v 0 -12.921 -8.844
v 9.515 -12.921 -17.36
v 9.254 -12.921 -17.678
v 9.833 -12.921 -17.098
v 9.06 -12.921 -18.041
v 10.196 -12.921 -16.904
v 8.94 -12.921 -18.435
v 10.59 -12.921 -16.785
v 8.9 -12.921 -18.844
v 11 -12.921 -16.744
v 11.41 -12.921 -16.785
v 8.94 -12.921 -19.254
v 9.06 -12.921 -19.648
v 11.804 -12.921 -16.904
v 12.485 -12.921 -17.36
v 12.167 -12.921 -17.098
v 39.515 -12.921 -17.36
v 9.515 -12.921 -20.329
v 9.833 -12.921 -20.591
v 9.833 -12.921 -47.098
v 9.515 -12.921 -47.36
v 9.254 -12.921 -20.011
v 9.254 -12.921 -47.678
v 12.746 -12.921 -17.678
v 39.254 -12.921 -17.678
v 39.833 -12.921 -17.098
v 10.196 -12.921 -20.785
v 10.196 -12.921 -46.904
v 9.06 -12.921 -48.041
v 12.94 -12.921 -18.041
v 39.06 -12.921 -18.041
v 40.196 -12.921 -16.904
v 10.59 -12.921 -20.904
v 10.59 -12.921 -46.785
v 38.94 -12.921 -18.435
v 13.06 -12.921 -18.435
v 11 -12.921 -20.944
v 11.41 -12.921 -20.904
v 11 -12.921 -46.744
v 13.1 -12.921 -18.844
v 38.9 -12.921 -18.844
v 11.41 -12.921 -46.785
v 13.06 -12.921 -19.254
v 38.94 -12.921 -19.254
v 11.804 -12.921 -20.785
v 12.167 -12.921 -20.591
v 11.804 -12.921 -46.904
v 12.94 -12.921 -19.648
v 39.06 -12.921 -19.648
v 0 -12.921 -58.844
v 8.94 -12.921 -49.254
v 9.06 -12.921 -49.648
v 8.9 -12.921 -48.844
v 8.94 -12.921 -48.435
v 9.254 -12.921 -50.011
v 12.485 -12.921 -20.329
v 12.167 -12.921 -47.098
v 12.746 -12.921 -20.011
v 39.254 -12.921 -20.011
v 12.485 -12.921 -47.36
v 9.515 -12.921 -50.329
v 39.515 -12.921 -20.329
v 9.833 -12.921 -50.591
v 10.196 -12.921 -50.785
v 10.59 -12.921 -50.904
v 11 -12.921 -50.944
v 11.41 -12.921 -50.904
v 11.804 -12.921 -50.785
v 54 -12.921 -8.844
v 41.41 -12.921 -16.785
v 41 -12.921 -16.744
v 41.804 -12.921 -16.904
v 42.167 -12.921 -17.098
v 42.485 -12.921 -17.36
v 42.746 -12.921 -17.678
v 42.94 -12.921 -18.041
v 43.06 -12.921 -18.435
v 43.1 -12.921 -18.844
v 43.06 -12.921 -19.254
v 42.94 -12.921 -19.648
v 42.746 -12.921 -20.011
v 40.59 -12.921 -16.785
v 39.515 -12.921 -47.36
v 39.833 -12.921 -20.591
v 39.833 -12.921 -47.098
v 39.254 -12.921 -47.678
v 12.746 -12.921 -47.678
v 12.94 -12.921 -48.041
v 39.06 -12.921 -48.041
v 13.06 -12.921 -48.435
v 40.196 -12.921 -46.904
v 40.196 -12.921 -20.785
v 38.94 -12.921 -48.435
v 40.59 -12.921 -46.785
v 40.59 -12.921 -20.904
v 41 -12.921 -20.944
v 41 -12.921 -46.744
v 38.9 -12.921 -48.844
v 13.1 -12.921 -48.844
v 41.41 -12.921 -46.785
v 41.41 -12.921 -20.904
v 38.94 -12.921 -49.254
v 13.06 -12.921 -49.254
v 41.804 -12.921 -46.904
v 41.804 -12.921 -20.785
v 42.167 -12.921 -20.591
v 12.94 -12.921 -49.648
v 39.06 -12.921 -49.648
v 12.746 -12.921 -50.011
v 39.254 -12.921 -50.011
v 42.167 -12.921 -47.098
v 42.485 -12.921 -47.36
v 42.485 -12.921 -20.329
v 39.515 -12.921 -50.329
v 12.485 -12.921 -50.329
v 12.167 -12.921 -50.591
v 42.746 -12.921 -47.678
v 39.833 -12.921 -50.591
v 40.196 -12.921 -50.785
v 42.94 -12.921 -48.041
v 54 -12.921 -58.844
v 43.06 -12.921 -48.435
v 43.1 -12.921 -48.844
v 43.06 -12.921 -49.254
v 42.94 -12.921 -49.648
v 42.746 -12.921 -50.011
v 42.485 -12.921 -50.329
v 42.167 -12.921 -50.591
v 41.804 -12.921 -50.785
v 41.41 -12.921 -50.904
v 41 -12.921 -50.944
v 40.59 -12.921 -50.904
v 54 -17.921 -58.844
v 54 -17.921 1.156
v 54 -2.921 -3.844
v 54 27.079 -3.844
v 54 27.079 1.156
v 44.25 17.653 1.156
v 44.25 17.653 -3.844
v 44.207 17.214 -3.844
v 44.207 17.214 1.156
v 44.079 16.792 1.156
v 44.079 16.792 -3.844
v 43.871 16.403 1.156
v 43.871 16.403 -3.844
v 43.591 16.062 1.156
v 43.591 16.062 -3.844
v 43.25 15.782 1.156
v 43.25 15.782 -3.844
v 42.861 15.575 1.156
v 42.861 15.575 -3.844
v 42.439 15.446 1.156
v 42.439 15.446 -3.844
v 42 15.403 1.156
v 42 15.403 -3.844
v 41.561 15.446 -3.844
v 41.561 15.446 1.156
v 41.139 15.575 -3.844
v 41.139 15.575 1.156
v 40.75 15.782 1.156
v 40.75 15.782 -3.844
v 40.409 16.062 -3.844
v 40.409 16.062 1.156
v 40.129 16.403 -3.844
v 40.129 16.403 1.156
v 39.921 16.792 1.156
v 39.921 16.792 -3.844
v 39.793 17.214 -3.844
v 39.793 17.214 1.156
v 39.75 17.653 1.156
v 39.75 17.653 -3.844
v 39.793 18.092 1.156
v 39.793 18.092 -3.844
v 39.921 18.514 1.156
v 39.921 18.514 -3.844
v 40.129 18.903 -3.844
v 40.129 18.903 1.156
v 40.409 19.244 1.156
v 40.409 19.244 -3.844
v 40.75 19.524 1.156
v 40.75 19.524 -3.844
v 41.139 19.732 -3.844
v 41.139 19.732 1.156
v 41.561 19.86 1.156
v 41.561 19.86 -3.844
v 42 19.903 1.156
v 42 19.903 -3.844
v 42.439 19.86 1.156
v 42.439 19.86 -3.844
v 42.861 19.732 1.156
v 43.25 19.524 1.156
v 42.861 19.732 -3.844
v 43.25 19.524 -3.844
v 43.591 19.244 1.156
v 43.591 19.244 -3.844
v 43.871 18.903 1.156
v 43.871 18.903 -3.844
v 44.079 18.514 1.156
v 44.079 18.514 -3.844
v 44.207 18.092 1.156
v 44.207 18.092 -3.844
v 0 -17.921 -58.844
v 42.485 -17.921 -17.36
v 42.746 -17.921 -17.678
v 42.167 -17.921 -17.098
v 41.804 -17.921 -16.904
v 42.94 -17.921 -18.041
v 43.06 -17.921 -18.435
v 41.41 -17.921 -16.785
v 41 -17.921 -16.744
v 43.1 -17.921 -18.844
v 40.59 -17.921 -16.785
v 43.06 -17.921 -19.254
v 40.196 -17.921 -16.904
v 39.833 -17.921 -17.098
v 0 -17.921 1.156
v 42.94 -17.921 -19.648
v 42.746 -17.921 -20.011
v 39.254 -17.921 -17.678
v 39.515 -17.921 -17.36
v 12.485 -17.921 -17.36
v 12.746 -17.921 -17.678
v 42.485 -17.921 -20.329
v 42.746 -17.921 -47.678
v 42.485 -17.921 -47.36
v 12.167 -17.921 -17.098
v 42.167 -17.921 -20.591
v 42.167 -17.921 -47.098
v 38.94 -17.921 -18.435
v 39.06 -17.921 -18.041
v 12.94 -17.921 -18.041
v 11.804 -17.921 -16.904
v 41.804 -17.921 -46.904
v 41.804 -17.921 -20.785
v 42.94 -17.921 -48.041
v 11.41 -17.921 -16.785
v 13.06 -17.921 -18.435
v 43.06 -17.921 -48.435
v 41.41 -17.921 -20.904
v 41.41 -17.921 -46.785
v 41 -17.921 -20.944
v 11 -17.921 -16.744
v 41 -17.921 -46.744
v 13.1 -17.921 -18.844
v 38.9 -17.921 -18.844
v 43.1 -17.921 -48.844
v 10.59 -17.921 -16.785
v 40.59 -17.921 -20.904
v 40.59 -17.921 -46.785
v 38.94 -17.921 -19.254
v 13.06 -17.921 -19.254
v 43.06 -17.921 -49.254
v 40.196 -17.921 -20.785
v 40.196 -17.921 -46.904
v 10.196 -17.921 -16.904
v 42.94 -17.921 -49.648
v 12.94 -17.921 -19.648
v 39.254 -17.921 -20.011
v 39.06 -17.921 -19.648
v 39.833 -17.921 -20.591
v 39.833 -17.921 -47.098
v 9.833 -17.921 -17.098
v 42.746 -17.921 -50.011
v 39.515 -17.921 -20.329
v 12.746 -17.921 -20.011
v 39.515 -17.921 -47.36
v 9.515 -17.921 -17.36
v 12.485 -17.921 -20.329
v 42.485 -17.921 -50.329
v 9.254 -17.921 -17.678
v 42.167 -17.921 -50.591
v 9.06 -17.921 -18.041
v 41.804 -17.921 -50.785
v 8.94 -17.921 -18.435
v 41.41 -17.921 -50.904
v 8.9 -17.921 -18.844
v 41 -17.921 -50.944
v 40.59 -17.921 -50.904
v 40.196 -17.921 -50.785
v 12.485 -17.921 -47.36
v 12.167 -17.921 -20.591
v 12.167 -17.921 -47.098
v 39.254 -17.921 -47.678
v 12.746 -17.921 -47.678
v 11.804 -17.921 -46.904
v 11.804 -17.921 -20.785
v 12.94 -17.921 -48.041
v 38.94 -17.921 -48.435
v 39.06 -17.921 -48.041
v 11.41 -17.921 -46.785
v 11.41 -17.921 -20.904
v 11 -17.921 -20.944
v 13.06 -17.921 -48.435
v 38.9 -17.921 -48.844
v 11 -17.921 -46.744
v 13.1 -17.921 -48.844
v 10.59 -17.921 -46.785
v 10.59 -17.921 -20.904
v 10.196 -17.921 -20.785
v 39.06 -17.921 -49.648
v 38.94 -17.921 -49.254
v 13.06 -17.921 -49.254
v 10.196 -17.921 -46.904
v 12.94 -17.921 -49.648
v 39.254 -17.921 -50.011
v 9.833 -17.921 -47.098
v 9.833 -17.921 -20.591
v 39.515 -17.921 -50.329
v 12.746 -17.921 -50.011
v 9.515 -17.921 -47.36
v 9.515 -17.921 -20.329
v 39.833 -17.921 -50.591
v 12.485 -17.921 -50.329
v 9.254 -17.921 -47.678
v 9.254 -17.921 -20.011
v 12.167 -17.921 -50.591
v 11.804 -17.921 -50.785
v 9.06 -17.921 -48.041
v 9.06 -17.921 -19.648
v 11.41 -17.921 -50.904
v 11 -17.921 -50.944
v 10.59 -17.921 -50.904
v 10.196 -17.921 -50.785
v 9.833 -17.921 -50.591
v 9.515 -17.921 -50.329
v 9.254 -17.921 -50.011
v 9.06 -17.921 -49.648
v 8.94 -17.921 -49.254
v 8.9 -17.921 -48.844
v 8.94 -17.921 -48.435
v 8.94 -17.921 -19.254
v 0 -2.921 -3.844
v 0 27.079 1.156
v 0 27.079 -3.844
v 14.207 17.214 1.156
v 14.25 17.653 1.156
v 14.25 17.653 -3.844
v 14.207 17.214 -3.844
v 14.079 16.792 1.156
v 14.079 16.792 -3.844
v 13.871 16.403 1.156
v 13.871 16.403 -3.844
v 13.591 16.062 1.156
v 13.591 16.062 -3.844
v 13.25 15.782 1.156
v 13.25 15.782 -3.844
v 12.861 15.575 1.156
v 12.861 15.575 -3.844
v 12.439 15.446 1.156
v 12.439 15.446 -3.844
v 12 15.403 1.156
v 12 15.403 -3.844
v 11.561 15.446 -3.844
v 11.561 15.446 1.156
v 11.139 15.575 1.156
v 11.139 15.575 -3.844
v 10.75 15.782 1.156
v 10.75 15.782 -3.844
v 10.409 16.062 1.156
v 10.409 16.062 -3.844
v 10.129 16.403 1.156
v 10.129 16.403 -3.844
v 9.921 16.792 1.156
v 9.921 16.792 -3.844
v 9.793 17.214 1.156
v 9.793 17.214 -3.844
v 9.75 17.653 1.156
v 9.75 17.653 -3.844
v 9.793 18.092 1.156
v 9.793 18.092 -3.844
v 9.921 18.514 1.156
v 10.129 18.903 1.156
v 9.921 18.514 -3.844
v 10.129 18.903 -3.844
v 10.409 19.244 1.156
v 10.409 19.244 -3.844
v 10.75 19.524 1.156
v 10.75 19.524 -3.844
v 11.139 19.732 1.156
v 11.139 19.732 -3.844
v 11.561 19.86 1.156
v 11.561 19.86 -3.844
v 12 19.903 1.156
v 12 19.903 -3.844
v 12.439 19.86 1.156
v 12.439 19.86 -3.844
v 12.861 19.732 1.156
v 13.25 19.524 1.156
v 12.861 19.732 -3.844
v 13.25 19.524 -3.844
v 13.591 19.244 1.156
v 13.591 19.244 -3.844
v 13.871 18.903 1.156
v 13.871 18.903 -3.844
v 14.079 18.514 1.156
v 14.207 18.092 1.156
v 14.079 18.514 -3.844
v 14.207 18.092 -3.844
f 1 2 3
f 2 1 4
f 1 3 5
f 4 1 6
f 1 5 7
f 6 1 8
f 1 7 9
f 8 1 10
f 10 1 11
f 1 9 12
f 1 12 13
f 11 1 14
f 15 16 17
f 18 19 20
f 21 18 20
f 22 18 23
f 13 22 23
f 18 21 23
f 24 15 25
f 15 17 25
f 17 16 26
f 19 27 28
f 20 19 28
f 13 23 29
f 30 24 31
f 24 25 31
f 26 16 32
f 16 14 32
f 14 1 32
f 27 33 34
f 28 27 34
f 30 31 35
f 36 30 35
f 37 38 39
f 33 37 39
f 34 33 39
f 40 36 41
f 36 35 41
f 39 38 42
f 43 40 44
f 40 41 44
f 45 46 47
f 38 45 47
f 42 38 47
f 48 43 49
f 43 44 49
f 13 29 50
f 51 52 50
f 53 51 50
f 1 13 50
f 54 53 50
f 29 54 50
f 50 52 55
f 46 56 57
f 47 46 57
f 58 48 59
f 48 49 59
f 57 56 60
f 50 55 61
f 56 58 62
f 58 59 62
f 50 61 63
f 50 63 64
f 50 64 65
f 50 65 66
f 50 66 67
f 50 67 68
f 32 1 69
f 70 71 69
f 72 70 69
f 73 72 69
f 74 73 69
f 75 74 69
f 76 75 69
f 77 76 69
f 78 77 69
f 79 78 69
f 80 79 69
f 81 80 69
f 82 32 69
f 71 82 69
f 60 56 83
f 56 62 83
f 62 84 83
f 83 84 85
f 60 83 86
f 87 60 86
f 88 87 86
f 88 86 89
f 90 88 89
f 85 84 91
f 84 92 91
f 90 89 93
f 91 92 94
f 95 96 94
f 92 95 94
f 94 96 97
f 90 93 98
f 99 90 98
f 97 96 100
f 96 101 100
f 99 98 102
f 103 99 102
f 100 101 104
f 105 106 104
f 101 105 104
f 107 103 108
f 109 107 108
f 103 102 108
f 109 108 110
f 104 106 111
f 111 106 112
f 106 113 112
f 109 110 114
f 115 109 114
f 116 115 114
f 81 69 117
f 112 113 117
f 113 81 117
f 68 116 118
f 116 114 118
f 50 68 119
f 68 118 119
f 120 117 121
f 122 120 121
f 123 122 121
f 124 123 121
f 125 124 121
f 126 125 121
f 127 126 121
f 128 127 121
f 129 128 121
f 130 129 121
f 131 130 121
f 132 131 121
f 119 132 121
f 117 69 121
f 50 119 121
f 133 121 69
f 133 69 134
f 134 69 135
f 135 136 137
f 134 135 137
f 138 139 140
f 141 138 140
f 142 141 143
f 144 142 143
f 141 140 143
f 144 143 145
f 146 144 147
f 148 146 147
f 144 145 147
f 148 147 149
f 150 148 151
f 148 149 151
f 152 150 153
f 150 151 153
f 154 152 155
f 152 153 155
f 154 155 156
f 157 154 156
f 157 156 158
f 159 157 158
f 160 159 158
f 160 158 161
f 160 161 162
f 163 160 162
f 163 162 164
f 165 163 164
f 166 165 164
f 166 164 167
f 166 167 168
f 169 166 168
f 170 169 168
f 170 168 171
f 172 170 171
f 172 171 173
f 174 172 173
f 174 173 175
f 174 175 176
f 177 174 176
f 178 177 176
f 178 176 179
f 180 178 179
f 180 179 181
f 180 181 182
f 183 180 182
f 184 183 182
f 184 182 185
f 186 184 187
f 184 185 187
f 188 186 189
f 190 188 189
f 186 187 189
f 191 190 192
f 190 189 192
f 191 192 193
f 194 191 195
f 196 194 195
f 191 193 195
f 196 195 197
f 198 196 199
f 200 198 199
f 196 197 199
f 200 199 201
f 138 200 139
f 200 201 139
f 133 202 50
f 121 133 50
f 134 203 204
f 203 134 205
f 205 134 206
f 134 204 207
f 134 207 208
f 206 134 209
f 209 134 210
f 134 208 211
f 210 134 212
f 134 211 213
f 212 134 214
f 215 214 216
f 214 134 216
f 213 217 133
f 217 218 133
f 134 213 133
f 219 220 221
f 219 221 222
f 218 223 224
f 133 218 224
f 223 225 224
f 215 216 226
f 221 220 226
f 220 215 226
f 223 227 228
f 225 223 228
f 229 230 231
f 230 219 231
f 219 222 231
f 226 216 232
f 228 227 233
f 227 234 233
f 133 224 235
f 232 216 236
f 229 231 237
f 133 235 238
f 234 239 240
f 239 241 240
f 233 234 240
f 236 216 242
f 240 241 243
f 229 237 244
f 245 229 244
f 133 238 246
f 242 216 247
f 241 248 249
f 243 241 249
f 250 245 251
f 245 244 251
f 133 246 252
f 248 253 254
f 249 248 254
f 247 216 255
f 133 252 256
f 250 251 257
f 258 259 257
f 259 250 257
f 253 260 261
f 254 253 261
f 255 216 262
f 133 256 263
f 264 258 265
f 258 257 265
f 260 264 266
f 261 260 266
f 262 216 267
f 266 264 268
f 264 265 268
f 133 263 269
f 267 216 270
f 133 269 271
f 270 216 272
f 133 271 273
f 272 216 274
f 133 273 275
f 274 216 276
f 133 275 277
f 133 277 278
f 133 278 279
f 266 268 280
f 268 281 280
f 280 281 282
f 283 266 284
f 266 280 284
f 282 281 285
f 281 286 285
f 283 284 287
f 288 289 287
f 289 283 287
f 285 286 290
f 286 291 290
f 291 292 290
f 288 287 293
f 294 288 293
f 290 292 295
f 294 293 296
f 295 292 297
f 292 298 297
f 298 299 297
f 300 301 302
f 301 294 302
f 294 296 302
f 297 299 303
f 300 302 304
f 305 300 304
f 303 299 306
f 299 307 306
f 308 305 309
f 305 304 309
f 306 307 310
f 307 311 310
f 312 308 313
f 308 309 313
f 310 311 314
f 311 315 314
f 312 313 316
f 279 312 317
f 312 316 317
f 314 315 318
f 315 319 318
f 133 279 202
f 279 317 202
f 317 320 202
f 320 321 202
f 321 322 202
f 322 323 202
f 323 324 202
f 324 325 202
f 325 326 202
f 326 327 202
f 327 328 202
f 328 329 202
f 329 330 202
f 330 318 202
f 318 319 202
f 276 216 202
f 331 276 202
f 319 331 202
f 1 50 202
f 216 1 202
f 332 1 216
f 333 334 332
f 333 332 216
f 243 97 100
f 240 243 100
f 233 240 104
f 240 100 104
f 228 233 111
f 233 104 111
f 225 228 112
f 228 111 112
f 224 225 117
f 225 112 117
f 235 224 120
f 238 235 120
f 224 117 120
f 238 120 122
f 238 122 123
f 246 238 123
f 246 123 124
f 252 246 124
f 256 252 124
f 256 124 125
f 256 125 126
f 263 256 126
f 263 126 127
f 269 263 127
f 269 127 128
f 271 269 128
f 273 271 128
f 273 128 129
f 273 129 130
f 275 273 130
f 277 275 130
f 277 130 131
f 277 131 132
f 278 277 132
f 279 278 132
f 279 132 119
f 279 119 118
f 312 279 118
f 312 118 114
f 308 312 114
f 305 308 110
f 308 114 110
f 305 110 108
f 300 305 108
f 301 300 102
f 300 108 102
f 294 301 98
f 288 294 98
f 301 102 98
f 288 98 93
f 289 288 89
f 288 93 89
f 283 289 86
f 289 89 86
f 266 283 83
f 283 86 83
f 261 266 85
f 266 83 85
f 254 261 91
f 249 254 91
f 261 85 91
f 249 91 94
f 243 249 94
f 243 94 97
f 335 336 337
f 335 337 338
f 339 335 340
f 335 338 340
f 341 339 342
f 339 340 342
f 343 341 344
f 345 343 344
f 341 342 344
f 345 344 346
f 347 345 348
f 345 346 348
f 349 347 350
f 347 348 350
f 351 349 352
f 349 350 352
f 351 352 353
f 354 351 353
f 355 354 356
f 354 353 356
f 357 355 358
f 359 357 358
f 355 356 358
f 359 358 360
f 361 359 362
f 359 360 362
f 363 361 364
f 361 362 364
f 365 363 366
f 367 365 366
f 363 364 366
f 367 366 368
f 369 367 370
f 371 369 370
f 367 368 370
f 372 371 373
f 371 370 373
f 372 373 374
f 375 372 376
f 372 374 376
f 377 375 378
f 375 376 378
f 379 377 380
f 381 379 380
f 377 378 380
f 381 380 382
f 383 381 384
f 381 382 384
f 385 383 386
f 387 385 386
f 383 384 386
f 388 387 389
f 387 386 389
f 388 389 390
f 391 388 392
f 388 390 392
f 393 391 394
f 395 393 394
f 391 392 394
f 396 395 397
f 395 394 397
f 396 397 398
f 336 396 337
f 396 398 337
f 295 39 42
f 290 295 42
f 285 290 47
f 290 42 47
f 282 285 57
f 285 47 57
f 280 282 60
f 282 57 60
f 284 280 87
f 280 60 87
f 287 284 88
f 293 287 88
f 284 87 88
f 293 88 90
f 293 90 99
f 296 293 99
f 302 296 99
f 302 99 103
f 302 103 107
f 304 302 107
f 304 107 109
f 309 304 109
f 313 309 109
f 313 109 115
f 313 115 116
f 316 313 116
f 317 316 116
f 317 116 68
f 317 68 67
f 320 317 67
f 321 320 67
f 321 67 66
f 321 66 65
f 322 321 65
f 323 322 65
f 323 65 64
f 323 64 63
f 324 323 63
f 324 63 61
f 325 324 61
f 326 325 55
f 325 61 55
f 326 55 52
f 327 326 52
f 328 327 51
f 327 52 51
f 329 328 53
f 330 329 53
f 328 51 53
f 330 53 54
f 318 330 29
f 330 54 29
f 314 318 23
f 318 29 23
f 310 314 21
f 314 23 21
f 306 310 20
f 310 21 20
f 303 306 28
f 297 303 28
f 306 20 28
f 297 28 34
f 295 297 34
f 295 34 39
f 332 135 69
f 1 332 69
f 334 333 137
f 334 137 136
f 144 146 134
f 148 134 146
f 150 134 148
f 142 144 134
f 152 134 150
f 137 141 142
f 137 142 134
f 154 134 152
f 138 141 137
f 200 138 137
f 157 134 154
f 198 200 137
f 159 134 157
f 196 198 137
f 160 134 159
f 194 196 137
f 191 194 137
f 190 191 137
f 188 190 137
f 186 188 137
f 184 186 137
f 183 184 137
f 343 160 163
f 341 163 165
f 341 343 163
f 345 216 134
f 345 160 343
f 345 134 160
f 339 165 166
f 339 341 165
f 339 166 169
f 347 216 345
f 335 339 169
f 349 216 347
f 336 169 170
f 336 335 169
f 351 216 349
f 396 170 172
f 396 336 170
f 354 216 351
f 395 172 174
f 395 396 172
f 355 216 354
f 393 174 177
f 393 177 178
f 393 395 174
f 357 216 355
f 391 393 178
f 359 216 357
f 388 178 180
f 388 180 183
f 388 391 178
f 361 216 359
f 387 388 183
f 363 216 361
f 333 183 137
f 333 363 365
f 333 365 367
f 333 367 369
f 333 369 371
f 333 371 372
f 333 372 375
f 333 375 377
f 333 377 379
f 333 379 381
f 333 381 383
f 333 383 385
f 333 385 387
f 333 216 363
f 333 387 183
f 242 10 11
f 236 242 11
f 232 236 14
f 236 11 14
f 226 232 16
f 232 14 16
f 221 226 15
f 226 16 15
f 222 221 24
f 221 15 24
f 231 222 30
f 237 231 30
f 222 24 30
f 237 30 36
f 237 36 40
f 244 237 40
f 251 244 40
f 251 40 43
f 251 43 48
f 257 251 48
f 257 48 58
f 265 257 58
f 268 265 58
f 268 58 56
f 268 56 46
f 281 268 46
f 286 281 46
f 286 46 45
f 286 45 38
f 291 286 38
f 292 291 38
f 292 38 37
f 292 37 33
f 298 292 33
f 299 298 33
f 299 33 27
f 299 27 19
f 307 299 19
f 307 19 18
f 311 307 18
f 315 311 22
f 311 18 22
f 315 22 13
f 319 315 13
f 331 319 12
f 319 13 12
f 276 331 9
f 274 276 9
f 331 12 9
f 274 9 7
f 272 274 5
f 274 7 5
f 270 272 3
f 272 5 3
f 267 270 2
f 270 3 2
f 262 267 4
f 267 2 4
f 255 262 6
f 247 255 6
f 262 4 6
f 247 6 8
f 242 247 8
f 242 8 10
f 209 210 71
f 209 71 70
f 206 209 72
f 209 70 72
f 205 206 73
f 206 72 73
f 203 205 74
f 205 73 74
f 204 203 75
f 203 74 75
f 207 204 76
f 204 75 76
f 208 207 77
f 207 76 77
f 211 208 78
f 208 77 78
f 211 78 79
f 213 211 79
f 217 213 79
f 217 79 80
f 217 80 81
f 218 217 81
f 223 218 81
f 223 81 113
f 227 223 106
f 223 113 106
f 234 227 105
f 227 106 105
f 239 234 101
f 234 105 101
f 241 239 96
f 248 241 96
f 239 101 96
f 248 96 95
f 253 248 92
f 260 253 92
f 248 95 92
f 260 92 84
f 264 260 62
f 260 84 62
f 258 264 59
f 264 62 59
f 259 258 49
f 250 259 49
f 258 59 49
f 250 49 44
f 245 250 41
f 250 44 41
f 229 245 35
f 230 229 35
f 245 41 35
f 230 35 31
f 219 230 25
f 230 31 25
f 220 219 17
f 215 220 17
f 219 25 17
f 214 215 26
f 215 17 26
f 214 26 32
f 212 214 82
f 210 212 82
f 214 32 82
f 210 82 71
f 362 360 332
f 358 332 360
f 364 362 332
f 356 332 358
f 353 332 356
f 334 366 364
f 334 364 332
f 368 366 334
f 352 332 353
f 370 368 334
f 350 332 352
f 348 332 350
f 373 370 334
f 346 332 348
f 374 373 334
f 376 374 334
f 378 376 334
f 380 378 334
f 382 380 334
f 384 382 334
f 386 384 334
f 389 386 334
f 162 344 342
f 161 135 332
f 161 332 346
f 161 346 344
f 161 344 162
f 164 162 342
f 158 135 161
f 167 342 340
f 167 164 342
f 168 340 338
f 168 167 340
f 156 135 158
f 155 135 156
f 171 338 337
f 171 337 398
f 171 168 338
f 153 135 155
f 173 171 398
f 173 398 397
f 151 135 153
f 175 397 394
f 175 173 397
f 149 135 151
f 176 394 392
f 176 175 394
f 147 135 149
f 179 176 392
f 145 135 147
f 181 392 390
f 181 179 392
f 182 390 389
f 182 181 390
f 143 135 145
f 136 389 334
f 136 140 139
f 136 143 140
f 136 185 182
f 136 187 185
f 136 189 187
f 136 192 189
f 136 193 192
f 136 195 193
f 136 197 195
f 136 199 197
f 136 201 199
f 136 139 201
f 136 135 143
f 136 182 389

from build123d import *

# Parameters (mm, degrees)
SKETCH_1_W          = 60
SKETCH_1_H          = 45
EXTRUDE_2_DEPTH     = 54
SKETCH_4_W          = 55
SKETCH_4_H          = 40
CUT_EXTRUDE_3_DEPTH = 54
SKETCH_5_R          = 2.25
CUT_EXTRUDE_4_DEPTH = 27
SKETCH_6_R          = 2.1
CUT_EXTRUDE_5_DEPTH = 27
EXTRUDE_3_DEPTH     = 54


with BuildPart() as part:
    # 草图1 → 凸台-拉伸2 (new body)
    with BuildSketch(Plane(origin=(0, 0, 0), x_dir=(0, 0, -1), z_dir=(1, 0, 0))):
        with Locations((28.844429728, 4.579365776)):
            Rectangle(SKETCH_1_W, SKETCH_1_H)
    extrude(amount=EXTRUDE_2_DEPTH)

    # 草图4 → 切除-拉伸3 (cut)
    with BuildSketch(Plane(origin=(54, 0, 0), x_dir=(0, 0, -1), z_dir=(1, 0, 0))):
        with Locations((31.344429728, 7.079365776)):
            Rectangle(SKETCH_4_W, SKETCH_4_H)
    extrude(amount=-CUT_EXTRUDE_3_DEPTH, mode=Mode.SUBTRACT)

    # 草图5 → 切除-拉伸4 (cut, symmetric)
    with BuildSketch(Plane(origin=(0, 0, -3.844429728), x_dir=(-1, 0, 0), z_dir=(0, 0, -1))):
        with Locations(Location((-42, 17.653246287, 0), (0, 0, 180))):
            Circle(SKETCH_5_R)
        with Locations(Location((-12, 17.653246287, 0), (0, 0, 180))):
            Circle(SKETCH_5_R)
    extrude(amount=CUT_EXTRUDE_4_DEPTH, both=True, mode=Mode.SUBTRACT)

    # 草图6 → 切除-拉伸5 (cut, symmetric)
    with BuildSketch(Plane(origin=(0, -12.920634224, 0), x_dir=(1, 0, 0), z_dir=(0, 1, 0))):
        with Locations(Location((11, 48.844429728, 0), (0, 0, 270))):
            Circle(SKETCH_6_R)
        with Locations(Location((41, 48.844429728, 0), (0, 0, 270))):
            Circle(SKETCH_6_R)
        with Locations(Location((11, 18.844429728, 0), (0, 0, 270))):
            Circle(SKETCH_6_R)
        with Locations(Location((41, 18.844429728, 0), (0, 0, 270))):
            Circle(SKETCH_6_R)
    extrude(amount=CUT_EXTRUDE_5_DEPTH, both=True, mode=Mode.SUBTRACT)

    # 草图7 → 凸台-拉伸3 (add)
    with BuildSketch(Plane(origin=(54, 0, 0), x_dir=(0, 0, -1), z_dir=(1, 0, 0))):
        Polygon((3.844429728, -2.920634224), (8.844429728, -12.920634224), (3.844429728, -12.920634224), align=None)
    extrude(amount=-EXTRUDE_3_DEPTH)


solid = part.part
